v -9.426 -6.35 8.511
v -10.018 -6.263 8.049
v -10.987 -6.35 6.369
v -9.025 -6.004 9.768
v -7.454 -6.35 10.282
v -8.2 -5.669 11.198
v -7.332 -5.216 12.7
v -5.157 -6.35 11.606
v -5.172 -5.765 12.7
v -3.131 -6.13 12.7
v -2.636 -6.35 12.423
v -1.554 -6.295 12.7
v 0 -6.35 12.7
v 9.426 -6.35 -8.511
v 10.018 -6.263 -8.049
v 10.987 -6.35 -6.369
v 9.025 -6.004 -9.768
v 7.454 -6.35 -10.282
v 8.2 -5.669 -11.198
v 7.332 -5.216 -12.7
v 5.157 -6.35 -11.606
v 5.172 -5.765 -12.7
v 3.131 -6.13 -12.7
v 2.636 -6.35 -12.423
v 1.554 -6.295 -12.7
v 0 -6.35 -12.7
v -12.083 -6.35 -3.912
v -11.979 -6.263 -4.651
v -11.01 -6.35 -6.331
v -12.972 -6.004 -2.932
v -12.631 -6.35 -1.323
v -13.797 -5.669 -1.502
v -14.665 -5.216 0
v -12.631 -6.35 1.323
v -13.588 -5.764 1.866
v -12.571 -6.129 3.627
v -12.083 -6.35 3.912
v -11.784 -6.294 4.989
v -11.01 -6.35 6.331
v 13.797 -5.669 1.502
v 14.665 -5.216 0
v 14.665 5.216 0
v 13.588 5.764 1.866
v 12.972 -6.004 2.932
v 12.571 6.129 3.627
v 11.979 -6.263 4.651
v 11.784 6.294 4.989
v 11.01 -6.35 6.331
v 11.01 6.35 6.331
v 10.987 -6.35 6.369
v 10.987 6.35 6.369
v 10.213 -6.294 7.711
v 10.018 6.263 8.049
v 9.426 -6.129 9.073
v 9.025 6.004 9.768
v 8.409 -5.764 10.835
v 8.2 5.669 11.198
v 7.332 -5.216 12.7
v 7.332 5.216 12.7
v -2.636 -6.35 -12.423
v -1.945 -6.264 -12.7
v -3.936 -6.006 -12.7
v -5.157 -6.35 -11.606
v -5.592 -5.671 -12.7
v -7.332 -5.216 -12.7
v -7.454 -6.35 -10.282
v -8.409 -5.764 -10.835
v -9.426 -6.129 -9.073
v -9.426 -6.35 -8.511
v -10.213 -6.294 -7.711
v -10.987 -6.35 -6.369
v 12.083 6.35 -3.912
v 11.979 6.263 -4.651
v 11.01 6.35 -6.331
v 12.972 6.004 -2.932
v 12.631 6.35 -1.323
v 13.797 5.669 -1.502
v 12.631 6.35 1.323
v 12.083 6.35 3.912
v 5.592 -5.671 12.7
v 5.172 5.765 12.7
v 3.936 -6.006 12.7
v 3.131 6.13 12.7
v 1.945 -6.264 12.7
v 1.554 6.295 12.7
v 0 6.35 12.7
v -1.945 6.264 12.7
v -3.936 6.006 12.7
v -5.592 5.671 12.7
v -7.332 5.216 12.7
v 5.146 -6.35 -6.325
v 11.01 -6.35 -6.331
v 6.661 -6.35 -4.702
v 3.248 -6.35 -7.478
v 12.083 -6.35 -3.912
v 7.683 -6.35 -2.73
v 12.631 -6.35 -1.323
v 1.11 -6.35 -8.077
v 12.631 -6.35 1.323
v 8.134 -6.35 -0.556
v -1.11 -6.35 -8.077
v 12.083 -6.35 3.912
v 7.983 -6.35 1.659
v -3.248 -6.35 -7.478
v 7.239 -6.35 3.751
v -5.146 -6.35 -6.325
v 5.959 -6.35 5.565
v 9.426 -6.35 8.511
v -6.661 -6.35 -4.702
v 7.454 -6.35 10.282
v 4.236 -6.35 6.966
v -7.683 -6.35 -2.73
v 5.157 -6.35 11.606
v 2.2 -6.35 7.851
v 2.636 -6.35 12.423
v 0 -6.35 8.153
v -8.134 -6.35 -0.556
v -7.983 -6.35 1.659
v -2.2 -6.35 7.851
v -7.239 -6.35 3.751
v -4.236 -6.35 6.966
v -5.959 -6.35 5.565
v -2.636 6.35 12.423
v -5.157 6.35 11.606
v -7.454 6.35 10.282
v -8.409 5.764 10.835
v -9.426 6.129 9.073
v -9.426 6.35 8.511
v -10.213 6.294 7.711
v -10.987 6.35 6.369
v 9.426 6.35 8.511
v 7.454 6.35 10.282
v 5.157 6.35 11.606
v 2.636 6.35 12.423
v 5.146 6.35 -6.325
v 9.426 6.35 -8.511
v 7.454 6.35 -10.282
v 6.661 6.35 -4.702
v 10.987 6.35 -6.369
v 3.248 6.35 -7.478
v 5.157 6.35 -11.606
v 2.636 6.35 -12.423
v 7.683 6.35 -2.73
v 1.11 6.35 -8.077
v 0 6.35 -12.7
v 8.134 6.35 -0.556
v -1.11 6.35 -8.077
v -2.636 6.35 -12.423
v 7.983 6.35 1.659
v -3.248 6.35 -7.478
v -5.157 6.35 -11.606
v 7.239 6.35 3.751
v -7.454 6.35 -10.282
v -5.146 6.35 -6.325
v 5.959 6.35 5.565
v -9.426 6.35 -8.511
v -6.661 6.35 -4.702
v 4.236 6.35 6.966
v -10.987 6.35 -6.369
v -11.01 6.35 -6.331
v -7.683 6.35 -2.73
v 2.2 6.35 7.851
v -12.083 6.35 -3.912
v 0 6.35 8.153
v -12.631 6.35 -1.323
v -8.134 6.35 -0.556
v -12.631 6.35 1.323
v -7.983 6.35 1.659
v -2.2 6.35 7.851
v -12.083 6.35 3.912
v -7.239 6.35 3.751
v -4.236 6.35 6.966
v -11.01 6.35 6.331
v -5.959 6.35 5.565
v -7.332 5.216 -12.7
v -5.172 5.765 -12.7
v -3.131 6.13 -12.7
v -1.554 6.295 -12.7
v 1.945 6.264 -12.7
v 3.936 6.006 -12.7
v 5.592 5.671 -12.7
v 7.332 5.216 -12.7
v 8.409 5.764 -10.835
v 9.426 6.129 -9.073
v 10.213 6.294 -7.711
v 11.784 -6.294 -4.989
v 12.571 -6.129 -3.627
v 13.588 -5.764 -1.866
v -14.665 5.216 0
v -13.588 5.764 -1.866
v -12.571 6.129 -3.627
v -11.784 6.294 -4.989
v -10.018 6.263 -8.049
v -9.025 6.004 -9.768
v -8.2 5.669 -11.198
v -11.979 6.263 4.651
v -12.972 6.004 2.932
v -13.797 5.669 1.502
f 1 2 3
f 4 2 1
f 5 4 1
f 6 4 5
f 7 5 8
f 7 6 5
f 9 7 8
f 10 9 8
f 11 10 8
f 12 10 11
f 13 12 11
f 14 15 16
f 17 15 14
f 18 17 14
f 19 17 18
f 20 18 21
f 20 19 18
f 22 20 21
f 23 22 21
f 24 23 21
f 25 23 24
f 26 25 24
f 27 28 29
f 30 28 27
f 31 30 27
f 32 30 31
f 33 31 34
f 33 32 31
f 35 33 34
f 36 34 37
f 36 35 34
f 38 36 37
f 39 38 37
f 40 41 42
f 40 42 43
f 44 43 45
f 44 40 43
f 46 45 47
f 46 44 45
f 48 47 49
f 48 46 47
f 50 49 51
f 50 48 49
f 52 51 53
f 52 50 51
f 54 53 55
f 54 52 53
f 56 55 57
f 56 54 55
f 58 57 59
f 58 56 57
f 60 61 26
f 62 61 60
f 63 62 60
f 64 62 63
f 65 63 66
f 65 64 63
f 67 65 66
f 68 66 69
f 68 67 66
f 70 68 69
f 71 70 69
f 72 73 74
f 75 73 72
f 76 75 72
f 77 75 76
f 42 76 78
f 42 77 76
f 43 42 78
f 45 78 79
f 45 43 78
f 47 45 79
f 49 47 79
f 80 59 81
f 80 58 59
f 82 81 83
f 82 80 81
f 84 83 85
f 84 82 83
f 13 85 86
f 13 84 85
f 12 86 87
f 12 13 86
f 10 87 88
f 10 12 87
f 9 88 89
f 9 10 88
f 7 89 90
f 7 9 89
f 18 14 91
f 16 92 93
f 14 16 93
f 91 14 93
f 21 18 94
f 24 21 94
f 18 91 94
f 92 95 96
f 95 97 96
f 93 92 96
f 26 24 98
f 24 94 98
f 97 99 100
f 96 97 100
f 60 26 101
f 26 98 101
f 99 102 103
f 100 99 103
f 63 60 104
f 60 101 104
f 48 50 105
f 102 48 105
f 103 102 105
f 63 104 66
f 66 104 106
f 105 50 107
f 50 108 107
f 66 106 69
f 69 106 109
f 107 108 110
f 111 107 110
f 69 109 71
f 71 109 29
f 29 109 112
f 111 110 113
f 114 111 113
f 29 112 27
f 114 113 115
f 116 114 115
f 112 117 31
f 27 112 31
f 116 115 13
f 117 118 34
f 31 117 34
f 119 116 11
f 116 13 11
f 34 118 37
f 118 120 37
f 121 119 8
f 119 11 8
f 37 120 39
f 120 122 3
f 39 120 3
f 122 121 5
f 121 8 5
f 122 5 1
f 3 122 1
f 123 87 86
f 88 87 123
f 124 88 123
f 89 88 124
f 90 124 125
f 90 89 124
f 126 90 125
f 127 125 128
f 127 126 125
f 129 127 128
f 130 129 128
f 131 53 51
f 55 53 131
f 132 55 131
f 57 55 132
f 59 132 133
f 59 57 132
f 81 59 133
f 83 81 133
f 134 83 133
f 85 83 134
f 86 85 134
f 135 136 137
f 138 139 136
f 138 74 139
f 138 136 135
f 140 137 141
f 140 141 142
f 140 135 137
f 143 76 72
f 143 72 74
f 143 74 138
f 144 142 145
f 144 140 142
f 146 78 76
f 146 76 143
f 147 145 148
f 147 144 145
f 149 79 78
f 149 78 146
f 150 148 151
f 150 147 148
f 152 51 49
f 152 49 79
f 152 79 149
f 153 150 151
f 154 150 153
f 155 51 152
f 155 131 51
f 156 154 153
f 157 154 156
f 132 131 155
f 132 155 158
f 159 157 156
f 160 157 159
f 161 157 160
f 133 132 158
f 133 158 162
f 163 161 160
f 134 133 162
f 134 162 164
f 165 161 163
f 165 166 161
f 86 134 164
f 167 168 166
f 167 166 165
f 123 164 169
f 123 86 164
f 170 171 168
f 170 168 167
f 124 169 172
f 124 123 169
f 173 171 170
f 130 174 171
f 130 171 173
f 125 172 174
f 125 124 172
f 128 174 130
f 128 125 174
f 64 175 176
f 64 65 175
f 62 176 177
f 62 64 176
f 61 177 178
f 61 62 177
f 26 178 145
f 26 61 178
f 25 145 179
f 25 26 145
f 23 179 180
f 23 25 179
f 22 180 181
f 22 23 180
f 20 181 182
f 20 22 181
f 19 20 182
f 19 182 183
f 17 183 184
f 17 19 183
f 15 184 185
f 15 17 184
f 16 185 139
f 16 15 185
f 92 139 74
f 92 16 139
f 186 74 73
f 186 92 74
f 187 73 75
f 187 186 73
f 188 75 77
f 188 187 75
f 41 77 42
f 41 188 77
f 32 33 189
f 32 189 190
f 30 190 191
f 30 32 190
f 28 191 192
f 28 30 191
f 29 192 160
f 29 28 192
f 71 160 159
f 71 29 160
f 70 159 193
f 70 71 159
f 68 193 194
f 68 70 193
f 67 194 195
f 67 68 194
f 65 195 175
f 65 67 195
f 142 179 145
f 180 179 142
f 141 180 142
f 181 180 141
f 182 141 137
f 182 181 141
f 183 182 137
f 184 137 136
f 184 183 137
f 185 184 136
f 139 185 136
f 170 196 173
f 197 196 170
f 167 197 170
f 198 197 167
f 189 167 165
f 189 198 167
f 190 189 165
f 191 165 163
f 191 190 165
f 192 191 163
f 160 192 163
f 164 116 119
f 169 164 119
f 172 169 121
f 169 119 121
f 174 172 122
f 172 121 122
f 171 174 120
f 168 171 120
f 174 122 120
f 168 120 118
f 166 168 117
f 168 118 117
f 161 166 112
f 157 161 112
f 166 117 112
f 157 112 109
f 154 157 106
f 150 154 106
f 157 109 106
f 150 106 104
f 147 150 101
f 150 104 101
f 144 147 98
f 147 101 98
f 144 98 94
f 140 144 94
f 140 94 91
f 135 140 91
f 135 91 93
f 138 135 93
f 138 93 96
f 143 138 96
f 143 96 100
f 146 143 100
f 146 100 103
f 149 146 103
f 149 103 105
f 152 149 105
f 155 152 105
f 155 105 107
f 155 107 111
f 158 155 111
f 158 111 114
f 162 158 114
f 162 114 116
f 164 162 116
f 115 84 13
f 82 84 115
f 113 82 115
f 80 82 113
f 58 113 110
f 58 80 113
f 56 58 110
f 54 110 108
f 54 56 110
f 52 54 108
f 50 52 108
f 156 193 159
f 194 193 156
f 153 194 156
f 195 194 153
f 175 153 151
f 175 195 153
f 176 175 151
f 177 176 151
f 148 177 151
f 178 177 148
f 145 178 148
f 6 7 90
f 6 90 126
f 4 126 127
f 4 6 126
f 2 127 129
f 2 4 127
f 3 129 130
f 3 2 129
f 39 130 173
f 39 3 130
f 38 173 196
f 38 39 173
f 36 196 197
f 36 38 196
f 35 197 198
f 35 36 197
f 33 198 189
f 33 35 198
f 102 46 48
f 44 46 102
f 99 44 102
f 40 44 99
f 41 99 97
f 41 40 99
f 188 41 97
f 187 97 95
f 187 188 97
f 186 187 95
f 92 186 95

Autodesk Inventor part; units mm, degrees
ref_plane "YZ Plane" through (0, 0, 0) normal (1, 0, 0) x (0, 1, 0)
ref_plane "XZ Plane" through (0, 0, 0) normal (0, 1, 0) x (-1, 0, 0)
ref_plane "XY Plane" through (0, 0, 0) normal (0, 0, 1) x (1, 0, 0)
sketch "Sketch3" plane through (0, 0, 0) normal (0, 1, 0) x (-1, 0, 0)
  line L0 (14.6647, 0) -> (7.3323, -12.7)
  line L1 (7.3323, -12.7) -> (-7.3323, -12.7)
  line L2 (-7.3323, -12.7) -> (-14.6647, 0)
  line L3 (-14.6647, 0) -> (-7.3323, 12.7)
  line L4 (-7.3323, 12.7) -> (7.3323, 12.7)
  line L5 (7.3323, 12.7) -> (14.6647, 0)
  point P0 (0, 0)
  point P1 (0, 0)
  point P2 (0, 0)
  dimension "d27" = 25.4
extrude "Extrusion2" add sketch "Sketch3" along normal mid plane 12.7
sketch "Sketch5" plane through (0, 0, 0) normal (0, 0, 1) x (1, 0, 0)
  line L0 (0, -17.78) -> (0, 17.78) projected
  line L1 (14.6647, 6.35) -> (7.3323, 6.35) construction
  line L2 (7.3323, 6.35) -> (7.3323, -6.35) projected
  line L3 (14.6647, 6.35) -> (7.3323, 6.35) projected
  line L4 (14.6647, 6.35) -> (14.6647, -6.35) construction
  line L5 (7.3323, -6.35) -> (14.6647, -6.35) projected
  line L6 (12.7, 6.35) -> (14.6647, 6.35)
  line L7 (14.6647, 6.35) -> (14.6647, 5.2157)
  line L8 (14.6647, 5.2157) -> (12.7, 6.35)
  line L9 (0, 0) -> (14.3088, 0) construction
  line L10 (12.7, -6.35) -> (14.6647, -6.35)
  line L11 (14.6647, -6.35) -> (14.6647, -5.2157)
  line L12 (14.6647, -5.2157) -> (12.7, -6.35)
  dimension "d15" = 25.4
  dimension "d16" = 30
revolve "Revolution3" cut sketch "Sketch5" angle 360 about axis through (0, -10, 0) along (0, 1, 0)
hole "Hole1" at (0, 6.35, 0) direction (0, -1, 0) diameter 16.3068 end through all thread size "3/4-10 UNC" class "2B" standard "ANSI Unified Screw Threads"
equation "\"diameter\" = 25.4"
equation "\"length\" = 76.2"
properties part number "Hinge Pin Nut" material "Steel, Carbon"
